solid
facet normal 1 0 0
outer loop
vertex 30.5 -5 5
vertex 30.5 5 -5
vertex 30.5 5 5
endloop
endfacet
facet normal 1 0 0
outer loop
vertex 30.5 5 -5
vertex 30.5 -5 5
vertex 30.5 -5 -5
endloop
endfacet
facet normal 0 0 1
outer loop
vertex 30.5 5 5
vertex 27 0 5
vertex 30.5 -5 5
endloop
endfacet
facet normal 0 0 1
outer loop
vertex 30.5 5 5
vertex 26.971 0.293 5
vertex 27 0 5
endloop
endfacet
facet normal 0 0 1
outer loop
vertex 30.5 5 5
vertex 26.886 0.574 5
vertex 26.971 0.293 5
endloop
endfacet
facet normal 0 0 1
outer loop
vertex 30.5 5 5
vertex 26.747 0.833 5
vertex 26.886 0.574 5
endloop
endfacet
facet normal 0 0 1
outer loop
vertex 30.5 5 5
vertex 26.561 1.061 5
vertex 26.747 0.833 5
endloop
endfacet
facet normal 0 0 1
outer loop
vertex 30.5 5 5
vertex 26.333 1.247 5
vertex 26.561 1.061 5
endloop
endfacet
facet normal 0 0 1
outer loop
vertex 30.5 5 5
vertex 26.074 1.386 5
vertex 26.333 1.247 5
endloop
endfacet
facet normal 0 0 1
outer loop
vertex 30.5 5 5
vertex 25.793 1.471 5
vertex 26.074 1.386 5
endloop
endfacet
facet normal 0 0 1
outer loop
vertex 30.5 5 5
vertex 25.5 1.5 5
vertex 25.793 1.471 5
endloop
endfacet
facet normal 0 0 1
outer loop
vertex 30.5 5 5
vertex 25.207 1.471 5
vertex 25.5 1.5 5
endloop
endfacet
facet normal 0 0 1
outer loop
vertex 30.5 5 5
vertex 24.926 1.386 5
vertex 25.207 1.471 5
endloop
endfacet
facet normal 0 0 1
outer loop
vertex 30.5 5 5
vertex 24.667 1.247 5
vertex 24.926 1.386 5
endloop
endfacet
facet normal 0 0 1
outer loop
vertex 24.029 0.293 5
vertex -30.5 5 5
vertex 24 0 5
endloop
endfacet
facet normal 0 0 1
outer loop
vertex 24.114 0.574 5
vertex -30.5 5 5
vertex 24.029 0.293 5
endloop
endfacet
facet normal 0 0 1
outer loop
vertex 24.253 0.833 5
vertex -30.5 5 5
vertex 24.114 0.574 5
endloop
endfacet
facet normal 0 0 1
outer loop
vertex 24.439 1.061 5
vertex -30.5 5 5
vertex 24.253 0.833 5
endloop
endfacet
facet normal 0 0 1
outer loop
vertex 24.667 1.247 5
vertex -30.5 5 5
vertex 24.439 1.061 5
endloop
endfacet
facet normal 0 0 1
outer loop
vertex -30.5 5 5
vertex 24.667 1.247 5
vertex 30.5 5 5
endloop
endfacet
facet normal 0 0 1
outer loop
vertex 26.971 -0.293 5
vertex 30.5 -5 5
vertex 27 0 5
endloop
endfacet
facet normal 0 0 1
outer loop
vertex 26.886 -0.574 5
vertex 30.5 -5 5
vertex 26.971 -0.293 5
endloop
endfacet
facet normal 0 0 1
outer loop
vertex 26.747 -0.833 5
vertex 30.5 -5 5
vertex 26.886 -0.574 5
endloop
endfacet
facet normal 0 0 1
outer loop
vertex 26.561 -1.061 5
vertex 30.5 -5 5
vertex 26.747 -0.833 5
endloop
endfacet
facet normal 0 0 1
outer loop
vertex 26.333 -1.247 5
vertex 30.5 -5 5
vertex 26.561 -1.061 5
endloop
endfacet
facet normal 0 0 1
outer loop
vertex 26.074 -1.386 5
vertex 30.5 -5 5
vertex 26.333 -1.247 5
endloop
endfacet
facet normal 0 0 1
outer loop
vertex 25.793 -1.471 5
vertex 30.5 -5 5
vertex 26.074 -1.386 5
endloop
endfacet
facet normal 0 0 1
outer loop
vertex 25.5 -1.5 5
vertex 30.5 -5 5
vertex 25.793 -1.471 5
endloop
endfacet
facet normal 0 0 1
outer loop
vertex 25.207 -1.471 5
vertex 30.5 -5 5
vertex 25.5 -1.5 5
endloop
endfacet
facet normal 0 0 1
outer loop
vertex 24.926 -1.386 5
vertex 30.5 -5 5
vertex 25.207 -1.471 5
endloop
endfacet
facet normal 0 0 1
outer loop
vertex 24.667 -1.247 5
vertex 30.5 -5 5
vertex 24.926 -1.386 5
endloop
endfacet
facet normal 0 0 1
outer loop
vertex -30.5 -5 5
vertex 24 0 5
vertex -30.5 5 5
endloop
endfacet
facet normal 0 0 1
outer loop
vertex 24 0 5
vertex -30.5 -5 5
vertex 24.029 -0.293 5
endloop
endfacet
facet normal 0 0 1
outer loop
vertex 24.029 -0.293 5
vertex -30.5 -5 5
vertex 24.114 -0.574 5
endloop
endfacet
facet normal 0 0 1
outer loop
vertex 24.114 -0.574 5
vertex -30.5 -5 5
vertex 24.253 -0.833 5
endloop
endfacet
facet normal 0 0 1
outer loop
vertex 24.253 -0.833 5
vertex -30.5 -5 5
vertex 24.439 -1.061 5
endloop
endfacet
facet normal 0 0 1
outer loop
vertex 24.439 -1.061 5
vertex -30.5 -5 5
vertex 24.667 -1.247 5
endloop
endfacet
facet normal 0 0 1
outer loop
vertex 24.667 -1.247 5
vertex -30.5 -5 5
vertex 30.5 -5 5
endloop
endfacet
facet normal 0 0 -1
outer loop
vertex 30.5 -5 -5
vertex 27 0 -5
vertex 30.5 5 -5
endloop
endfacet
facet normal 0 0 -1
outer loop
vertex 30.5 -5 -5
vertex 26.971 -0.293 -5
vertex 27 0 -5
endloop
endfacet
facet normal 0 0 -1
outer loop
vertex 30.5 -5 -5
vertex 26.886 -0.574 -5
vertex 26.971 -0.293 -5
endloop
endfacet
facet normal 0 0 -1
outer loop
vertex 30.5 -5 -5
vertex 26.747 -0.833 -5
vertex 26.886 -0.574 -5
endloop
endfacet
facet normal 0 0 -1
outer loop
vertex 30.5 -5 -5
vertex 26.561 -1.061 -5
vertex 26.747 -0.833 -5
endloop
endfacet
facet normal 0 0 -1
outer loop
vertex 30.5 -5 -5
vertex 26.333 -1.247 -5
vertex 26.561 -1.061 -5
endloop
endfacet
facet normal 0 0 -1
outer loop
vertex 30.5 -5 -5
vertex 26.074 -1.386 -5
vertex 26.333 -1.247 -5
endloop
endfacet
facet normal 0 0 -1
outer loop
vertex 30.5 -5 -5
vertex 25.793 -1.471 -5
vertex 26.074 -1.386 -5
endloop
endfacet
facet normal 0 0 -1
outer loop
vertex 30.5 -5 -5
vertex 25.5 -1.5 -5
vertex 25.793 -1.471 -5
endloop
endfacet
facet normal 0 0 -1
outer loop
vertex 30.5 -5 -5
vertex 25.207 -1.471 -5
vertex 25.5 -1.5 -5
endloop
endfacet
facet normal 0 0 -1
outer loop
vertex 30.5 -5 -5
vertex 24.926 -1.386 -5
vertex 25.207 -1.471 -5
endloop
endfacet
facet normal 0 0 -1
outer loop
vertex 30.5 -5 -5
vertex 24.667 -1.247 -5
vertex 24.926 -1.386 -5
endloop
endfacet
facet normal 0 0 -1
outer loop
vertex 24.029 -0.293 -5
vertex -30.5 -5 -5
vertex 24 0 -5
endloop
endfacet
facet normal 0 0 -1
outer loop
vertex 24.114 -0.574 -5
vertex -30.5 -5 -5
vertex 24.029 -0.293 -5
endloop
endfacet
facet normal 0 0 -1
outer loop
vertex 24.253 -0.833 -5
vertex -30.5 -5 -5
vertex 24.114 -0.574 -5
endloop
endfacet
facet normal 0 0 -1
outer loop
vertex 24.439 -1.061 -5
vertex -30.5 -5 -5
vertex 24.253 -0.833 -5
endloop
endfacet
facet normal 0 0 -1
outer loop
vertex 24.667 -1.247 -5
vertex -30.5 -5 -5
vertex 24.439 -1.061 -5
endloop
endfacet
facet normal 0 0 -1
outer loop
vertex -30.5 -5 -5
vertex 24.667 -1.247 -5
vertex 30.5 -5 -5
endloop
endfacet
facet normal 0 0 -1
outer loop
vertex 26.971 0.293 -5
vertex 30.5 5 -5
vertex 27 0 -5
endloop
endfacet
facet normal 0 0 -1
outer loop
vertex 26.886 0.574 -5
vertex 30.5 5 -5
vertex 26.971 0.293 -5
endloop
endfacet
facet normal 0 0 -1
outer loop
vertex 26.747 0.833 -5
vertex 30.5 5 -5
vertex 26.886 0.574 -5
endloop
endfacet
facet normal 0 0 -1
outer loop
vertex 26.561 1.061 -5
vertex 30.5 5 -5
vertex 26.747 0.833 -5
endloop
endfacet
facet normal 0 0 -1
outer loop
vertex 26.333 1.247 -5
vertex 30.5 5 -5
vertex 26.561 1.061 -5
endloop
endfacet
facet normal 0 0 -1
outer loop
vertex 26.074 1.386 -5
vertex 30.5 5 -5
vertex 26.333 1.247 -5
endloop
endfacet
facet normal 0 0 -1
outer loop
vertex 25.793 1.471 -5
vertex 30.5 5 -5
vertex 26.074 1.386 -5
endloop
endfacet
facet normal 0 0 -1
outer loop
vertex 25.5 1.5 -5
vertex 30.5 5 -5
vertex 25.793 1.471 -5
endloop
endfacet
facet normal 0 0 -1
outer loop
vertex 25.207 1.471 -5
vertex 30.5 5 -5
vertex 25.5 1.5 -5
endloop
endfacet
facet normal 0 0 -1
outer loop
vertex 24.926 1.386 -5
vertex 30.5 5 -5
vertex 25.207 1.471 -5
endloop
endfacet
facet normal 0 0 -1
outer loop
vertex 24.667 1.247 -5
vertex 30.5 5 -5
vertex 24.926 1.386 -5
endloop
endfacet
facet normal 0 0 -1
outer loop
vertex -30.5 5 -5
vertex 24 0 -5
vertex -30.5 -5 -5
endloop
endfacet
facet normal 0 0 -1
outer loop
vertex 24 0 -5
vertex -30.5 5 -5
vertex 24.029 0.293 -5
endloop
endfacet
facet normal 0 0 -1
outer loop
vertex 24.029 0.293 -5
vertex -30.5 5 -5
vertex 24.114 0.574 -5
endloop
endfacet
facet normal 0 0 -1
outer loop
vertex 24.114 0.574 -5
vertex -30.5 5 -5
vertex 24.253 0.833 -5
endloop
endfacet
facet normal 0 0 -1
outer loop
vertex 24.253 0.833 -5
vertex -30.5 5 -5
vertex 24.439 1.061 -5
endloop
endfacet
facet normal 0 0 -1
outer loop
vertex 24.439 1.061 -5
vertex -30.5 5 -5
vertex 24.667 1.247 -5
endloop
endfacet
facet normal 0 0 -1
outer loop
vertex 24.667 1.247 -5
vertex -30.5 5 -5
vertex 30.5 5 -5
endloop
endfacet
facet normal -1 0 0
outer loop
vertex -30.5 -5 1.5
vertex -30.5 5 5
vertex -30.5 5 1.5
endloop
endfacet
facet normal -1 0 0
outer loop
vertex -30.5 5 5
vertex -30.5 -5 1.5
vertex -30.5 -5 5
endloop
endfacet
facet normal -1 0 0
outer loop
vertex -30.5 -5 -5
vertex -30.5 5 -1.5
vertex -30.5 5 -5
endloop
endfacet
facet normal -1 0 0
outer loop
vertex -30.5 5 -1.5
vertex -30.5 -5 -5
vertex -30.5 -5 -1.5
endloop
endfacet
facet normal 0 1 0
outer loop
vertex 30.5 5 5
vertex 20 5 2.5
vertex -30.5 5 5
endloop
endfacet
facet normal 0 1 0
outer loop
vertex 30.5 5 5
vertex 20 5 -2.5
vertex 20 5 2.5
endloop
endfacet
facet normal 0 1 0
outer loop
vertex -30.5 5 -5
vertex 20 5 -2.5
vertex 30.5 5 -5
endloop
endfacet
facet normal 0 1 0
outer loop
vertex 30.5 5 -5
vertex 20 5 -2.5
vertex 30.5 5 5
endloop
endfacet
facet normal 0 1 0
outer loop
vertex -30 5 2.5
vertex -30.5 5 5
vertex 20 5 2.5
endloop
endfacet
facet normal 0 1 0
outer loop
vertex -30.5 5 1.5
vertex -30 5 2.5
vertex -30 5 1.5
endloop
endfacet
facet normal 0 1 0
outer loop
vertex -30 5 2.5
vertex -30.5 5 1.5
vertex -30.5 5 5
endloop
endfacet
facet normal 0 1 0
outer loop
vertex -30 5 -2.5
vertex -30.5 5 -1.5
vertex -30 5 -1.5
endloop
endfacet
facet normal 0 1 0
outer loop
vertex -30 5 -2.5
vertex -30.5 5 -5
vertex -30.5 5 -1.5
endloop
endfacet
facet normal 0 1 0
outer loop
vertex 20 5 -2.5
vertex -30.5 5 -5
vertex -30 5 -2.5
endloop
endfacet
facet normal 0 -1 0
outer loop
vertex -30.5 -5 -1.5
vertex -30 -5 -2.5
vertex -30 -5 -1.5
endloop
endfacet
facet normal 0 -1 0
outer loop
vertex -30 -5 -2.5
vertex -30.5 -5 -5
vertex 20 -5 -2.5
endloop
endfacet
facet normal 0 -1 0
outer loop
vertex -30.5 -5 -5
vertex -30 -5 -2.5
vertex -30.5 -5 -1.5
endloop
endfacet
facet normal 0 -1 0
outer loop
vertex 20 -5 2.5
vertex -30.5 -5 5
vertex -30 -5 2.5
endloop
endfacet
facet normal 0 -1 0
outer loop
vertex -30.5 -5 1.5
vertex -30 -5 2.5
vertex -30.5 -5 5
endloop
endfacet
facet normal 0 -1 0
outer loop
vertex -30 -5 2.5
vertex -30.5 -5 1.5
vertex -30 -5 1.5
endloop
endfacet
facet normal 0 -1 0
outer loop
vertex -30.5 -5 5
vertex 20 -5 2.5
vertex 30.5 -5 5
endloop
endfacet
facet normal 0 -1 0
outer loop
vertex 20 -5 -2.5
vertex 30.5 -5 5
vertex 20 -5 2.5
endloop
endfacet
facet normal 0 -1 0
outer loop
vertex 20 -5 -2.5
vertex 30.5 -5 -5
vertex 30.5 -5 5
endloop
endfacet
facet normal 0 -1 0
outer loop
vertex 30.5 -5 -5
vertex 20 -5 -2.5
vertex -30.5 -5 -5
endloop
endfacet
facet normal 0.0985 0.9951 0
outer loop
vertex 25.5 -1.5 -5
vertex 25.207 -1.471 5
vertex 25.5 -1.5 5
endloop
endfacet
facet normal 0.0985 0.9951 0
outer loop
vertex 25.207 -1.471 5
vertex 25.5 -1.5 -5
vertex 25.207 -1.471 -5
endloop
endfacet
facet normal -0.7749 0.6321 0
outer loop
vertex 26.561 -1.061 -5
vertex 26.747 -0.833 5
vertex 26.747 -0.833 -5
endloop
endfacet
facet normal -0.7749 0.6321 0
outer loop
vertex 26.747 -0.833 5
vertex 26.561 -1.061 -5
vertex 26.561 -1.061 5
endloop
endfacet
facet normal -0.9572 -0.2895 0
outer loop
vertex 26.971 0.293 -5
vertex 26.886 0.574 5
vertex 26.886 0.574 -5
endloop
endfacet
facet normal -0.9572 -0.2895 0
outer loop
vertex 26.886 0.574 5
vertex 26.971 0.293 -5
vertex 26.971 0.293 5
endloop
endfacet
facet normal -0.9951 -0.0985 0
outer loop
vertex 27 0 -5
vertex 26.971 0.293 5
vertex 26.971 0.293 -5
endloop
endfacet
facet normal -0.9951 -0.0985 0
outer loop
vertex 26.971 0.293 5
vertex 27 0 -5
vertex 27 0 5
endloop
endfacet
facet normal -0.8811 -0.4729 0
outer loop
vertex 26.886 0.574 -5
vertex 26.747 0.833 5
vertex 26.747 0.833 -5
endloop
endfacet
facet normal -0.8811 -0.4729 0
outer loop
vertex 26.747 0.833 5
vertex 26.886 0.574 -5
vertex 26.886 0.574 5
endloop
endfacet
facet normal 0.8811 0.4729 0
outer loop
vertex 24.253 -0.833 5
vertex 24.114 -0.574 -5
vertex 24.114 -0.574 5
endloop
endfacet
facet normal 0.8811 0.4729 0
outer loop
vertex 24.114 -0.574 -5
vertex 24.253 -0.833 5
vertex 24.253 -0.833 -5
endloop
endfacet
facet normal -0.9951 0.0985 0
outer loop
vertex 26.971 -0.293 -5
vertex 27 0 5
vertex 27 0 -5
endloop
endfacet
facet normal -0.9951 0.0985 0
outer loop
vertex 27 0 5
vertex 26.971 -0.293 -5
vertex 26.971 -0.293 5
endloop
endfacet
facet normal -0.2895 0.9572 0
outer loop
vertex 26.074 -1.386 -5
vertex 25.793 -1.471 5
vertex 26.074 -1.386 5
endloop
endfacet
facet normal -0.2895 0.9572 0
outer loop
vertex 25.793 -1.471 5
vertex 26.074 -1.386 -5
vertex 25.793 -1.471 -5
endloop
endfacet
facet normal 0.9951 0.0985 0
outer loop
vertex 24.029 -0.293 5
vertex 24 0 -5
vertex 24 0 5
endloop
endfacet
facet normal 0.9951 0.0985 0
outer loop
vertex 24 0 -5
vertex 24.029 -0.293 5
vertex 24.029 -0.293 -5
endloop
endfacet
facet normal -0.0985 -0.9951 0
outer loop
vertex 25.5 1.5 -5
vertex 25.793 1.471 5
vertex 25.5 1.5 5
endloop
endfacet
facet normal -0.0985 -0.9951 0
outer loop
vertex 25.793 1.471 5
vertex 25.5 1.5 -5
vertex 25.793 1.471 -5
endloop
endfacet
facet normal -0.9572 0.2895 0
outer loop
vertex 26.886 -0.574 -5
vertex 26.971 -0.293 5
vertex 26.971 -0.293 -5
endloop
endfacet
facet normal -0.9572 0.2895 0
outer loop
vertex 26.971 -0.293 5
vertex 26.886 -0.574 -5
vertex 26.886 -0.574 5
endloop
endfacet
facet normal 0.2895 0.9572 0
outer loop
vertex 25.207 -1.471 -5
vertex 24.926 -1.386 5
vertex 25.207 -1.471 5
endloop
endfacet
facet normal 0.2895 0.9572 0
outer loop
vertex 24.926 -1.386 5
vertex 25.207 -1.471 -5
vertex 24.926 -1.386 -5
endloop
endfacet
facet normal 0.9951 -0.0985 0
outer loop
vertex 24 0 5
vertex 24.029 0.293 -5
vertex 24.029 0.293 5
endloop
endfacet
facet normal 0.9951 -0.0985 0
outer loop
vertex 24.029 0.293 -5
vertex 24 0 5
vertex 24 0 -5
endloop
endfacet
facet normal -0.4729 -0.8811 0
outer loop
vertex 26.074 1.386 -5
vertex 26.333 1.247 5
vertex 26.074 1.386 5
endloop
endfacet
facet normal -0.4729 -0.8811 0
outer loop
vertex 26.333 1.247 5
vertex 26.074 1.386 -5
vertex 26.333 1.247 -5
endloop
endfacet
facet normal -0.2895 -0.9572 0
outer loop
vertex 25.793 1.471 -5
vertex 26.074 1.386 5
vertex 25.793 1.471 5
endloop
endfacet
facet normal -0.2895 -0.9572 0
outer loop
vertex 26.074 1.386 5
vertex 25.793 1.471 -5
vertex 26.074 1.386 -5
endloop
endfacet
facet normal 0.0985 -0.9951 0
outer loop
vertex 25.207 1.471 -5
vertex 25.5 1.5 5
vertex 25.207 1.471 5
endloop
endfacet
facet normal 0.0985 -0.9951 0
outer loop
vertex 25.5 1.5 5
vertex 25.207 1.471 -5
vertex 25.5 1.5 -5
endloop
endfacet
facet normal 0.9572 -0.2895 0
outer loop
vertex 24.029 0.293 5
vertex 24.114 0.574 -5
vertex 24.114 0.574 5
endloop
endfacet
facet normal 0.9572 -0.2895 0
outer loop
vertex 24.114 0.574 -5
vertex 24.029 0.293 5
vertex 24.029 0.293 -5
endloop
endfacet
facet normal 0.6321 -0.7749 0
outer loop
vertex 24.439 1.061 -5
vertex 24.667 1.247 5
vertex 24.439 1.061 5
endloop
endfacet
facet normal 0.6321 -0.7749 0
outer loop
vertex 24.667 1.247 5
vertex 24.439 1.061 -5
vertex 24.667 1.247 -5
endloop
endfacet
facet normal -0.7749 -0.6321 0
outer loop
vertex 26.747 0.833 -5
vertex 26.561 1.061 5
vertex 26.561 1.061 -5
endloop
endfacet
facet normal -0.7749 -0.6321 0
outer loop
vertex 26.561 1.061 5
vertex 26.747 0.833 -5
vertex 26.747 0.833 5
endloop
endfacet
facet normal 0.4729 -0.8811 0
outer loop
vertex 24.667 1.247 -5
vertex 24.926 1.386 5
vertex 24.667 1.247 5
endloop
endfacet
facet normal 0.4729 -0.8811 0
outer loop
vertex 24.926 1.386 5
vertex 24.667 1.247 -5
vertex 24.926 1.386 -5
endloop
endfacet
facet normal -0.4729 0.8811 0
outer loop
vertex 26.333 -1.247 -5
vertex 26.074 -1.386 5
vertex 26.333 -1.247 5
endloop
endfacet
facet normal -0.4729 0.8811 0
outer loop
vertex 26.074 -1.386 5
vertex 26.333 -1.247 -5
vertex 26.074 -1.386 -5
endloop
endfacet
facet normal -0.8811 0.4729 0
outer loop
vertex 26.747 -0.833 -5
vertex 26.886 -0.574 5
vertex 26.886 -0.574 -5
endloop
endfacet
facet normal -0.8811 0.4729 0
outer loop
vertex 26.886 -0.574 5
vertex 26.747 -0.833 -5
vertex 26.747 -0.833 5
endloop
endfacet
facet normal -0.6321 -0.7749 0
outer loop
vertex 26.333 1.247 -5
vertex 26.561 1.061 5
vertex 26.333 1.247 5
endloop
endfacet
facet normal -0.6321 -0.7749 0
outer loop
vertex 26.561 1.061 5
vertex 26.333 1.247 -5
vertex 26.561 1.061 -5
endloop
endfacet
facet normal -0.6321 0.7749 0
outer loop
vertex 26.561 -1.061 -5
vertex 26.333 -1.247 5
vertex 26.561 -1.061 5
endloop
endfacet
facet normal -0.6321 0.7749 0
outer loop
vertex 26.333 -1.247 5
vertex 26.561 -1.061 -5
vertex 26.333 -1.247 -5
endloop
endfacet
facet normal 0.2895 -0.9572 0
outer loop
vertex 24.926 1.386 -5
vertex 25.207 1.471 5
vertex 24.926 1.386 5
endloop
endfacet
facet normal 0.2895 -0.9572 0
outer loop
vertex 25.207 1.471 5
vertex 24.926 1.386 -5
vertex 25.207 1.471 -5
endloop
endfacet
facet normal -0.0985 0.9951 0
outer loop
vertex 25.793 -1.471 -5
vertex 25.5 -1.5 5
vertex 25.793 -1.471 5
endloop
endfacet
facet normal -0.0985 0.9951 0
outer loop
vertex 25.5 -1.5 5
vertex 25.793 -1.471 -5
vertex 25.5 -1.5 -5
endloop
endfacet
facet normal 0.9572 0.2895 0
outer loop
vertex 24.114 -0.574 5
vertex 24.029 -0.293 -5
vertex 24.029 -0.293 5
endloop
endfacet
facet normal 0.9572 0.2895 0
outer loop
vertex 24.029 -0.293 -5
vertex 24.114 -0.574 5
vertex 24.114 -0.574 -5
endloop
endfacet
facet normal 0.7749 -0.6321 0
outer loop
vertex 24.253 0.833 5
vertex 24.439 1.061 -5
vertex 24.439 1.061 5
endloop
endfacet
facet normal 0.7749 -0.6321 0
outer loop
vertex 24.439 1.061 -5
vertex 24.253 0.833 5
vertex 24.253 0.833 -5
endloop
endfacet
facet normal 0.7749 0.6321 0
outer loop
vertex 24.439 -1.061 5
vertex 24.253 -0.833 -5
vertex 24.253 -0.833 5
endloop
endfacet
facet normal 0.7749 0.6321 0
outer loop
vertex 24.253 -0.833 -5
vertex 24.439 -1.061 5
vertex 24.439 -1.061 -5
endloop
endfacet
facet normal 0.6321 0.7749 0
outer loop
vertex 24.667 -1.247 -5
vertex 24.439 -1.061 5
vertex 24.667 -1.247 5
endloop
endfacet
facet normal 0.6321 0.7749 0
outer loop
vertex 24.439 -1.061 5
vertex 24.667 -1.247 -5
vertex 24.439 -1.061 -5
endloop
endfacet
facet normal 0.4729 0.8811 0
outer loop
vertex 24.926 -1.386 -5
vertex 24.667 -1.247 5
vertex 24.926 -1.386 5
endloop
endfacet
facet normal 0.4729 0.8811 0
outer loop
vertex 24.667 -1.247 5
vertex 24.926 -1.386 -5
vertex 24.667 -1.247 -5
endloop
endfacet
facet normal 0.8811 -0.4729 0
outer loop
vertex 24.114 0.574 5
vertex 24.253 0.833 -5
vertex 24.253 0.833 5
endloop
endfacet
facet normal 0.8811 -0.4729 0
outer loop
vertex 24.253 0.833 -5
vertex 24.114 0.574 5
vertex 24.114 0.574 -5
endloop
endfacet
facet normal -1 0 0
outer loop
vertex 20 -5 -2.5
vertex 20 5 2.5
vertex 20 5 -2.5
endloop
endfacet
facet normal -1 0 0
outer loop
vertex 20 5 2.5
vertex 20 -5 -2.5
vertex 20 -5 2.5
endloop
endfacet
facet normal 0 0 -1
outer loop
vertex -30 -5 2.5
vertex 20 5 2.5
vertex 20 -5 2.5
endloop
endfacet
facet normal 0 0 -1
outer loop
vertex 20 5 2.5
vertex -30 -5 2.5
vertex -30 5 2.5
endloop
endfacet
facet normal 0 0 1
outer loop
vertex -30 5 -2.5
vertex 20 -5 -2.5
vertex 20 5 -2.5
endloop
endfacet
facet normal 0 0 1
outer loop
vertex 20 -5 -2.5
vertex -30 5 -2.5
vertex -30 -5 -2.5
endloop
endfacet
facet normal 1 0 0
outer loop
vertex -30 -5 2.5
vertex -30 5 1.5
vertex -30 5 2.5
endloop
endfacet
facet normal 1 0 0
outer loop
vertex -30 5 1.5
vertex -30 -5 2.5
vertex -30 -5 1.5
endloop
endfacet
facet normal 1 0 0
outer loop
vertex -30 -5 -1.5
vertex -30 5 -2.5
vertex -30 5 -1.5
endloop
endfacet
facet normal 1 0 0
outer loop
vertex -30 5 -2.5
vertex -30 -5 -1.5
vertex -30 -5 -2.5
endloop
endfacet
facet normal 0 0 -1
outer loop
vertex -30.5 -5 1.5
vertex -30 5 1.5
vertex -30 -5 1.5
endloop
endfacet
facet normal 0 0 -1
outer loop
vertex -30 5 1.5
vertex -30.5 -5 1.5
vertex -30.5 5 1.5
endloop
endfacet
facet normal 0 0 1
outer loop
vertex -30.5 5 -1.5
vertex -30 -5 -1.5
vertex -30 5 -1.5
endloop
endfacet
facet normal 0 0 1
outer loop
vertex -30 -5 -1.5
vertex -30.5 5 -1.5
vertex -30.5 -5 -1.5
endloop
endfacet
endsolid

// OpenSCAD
// Filament guide for OneUp printer from QU-BD
//
// (c) 2014 Laird Popkin

barWidth = 50;
barThick = 5;
thick=2.5;
height = barThick+2*thick;
head = 10;
tubeD = 3;
tubeR = tubeD/2;
width = 10;
snap=1;
$fn=32;

len=barWidth+snap+head;

difference() {
	cube([len, width, height], center=true);
	translate([len/2-head/2,0,0]) cylinder(r=tubeR, h=height+2, center=true);
	translate([-head/2,0,0]) cube([barWidth,barWidth,barThick], center=true);
	translate([-head/2-snap,0,0]) cube([barWidth,barWidth,barThick-2*snap], center=true);
}
